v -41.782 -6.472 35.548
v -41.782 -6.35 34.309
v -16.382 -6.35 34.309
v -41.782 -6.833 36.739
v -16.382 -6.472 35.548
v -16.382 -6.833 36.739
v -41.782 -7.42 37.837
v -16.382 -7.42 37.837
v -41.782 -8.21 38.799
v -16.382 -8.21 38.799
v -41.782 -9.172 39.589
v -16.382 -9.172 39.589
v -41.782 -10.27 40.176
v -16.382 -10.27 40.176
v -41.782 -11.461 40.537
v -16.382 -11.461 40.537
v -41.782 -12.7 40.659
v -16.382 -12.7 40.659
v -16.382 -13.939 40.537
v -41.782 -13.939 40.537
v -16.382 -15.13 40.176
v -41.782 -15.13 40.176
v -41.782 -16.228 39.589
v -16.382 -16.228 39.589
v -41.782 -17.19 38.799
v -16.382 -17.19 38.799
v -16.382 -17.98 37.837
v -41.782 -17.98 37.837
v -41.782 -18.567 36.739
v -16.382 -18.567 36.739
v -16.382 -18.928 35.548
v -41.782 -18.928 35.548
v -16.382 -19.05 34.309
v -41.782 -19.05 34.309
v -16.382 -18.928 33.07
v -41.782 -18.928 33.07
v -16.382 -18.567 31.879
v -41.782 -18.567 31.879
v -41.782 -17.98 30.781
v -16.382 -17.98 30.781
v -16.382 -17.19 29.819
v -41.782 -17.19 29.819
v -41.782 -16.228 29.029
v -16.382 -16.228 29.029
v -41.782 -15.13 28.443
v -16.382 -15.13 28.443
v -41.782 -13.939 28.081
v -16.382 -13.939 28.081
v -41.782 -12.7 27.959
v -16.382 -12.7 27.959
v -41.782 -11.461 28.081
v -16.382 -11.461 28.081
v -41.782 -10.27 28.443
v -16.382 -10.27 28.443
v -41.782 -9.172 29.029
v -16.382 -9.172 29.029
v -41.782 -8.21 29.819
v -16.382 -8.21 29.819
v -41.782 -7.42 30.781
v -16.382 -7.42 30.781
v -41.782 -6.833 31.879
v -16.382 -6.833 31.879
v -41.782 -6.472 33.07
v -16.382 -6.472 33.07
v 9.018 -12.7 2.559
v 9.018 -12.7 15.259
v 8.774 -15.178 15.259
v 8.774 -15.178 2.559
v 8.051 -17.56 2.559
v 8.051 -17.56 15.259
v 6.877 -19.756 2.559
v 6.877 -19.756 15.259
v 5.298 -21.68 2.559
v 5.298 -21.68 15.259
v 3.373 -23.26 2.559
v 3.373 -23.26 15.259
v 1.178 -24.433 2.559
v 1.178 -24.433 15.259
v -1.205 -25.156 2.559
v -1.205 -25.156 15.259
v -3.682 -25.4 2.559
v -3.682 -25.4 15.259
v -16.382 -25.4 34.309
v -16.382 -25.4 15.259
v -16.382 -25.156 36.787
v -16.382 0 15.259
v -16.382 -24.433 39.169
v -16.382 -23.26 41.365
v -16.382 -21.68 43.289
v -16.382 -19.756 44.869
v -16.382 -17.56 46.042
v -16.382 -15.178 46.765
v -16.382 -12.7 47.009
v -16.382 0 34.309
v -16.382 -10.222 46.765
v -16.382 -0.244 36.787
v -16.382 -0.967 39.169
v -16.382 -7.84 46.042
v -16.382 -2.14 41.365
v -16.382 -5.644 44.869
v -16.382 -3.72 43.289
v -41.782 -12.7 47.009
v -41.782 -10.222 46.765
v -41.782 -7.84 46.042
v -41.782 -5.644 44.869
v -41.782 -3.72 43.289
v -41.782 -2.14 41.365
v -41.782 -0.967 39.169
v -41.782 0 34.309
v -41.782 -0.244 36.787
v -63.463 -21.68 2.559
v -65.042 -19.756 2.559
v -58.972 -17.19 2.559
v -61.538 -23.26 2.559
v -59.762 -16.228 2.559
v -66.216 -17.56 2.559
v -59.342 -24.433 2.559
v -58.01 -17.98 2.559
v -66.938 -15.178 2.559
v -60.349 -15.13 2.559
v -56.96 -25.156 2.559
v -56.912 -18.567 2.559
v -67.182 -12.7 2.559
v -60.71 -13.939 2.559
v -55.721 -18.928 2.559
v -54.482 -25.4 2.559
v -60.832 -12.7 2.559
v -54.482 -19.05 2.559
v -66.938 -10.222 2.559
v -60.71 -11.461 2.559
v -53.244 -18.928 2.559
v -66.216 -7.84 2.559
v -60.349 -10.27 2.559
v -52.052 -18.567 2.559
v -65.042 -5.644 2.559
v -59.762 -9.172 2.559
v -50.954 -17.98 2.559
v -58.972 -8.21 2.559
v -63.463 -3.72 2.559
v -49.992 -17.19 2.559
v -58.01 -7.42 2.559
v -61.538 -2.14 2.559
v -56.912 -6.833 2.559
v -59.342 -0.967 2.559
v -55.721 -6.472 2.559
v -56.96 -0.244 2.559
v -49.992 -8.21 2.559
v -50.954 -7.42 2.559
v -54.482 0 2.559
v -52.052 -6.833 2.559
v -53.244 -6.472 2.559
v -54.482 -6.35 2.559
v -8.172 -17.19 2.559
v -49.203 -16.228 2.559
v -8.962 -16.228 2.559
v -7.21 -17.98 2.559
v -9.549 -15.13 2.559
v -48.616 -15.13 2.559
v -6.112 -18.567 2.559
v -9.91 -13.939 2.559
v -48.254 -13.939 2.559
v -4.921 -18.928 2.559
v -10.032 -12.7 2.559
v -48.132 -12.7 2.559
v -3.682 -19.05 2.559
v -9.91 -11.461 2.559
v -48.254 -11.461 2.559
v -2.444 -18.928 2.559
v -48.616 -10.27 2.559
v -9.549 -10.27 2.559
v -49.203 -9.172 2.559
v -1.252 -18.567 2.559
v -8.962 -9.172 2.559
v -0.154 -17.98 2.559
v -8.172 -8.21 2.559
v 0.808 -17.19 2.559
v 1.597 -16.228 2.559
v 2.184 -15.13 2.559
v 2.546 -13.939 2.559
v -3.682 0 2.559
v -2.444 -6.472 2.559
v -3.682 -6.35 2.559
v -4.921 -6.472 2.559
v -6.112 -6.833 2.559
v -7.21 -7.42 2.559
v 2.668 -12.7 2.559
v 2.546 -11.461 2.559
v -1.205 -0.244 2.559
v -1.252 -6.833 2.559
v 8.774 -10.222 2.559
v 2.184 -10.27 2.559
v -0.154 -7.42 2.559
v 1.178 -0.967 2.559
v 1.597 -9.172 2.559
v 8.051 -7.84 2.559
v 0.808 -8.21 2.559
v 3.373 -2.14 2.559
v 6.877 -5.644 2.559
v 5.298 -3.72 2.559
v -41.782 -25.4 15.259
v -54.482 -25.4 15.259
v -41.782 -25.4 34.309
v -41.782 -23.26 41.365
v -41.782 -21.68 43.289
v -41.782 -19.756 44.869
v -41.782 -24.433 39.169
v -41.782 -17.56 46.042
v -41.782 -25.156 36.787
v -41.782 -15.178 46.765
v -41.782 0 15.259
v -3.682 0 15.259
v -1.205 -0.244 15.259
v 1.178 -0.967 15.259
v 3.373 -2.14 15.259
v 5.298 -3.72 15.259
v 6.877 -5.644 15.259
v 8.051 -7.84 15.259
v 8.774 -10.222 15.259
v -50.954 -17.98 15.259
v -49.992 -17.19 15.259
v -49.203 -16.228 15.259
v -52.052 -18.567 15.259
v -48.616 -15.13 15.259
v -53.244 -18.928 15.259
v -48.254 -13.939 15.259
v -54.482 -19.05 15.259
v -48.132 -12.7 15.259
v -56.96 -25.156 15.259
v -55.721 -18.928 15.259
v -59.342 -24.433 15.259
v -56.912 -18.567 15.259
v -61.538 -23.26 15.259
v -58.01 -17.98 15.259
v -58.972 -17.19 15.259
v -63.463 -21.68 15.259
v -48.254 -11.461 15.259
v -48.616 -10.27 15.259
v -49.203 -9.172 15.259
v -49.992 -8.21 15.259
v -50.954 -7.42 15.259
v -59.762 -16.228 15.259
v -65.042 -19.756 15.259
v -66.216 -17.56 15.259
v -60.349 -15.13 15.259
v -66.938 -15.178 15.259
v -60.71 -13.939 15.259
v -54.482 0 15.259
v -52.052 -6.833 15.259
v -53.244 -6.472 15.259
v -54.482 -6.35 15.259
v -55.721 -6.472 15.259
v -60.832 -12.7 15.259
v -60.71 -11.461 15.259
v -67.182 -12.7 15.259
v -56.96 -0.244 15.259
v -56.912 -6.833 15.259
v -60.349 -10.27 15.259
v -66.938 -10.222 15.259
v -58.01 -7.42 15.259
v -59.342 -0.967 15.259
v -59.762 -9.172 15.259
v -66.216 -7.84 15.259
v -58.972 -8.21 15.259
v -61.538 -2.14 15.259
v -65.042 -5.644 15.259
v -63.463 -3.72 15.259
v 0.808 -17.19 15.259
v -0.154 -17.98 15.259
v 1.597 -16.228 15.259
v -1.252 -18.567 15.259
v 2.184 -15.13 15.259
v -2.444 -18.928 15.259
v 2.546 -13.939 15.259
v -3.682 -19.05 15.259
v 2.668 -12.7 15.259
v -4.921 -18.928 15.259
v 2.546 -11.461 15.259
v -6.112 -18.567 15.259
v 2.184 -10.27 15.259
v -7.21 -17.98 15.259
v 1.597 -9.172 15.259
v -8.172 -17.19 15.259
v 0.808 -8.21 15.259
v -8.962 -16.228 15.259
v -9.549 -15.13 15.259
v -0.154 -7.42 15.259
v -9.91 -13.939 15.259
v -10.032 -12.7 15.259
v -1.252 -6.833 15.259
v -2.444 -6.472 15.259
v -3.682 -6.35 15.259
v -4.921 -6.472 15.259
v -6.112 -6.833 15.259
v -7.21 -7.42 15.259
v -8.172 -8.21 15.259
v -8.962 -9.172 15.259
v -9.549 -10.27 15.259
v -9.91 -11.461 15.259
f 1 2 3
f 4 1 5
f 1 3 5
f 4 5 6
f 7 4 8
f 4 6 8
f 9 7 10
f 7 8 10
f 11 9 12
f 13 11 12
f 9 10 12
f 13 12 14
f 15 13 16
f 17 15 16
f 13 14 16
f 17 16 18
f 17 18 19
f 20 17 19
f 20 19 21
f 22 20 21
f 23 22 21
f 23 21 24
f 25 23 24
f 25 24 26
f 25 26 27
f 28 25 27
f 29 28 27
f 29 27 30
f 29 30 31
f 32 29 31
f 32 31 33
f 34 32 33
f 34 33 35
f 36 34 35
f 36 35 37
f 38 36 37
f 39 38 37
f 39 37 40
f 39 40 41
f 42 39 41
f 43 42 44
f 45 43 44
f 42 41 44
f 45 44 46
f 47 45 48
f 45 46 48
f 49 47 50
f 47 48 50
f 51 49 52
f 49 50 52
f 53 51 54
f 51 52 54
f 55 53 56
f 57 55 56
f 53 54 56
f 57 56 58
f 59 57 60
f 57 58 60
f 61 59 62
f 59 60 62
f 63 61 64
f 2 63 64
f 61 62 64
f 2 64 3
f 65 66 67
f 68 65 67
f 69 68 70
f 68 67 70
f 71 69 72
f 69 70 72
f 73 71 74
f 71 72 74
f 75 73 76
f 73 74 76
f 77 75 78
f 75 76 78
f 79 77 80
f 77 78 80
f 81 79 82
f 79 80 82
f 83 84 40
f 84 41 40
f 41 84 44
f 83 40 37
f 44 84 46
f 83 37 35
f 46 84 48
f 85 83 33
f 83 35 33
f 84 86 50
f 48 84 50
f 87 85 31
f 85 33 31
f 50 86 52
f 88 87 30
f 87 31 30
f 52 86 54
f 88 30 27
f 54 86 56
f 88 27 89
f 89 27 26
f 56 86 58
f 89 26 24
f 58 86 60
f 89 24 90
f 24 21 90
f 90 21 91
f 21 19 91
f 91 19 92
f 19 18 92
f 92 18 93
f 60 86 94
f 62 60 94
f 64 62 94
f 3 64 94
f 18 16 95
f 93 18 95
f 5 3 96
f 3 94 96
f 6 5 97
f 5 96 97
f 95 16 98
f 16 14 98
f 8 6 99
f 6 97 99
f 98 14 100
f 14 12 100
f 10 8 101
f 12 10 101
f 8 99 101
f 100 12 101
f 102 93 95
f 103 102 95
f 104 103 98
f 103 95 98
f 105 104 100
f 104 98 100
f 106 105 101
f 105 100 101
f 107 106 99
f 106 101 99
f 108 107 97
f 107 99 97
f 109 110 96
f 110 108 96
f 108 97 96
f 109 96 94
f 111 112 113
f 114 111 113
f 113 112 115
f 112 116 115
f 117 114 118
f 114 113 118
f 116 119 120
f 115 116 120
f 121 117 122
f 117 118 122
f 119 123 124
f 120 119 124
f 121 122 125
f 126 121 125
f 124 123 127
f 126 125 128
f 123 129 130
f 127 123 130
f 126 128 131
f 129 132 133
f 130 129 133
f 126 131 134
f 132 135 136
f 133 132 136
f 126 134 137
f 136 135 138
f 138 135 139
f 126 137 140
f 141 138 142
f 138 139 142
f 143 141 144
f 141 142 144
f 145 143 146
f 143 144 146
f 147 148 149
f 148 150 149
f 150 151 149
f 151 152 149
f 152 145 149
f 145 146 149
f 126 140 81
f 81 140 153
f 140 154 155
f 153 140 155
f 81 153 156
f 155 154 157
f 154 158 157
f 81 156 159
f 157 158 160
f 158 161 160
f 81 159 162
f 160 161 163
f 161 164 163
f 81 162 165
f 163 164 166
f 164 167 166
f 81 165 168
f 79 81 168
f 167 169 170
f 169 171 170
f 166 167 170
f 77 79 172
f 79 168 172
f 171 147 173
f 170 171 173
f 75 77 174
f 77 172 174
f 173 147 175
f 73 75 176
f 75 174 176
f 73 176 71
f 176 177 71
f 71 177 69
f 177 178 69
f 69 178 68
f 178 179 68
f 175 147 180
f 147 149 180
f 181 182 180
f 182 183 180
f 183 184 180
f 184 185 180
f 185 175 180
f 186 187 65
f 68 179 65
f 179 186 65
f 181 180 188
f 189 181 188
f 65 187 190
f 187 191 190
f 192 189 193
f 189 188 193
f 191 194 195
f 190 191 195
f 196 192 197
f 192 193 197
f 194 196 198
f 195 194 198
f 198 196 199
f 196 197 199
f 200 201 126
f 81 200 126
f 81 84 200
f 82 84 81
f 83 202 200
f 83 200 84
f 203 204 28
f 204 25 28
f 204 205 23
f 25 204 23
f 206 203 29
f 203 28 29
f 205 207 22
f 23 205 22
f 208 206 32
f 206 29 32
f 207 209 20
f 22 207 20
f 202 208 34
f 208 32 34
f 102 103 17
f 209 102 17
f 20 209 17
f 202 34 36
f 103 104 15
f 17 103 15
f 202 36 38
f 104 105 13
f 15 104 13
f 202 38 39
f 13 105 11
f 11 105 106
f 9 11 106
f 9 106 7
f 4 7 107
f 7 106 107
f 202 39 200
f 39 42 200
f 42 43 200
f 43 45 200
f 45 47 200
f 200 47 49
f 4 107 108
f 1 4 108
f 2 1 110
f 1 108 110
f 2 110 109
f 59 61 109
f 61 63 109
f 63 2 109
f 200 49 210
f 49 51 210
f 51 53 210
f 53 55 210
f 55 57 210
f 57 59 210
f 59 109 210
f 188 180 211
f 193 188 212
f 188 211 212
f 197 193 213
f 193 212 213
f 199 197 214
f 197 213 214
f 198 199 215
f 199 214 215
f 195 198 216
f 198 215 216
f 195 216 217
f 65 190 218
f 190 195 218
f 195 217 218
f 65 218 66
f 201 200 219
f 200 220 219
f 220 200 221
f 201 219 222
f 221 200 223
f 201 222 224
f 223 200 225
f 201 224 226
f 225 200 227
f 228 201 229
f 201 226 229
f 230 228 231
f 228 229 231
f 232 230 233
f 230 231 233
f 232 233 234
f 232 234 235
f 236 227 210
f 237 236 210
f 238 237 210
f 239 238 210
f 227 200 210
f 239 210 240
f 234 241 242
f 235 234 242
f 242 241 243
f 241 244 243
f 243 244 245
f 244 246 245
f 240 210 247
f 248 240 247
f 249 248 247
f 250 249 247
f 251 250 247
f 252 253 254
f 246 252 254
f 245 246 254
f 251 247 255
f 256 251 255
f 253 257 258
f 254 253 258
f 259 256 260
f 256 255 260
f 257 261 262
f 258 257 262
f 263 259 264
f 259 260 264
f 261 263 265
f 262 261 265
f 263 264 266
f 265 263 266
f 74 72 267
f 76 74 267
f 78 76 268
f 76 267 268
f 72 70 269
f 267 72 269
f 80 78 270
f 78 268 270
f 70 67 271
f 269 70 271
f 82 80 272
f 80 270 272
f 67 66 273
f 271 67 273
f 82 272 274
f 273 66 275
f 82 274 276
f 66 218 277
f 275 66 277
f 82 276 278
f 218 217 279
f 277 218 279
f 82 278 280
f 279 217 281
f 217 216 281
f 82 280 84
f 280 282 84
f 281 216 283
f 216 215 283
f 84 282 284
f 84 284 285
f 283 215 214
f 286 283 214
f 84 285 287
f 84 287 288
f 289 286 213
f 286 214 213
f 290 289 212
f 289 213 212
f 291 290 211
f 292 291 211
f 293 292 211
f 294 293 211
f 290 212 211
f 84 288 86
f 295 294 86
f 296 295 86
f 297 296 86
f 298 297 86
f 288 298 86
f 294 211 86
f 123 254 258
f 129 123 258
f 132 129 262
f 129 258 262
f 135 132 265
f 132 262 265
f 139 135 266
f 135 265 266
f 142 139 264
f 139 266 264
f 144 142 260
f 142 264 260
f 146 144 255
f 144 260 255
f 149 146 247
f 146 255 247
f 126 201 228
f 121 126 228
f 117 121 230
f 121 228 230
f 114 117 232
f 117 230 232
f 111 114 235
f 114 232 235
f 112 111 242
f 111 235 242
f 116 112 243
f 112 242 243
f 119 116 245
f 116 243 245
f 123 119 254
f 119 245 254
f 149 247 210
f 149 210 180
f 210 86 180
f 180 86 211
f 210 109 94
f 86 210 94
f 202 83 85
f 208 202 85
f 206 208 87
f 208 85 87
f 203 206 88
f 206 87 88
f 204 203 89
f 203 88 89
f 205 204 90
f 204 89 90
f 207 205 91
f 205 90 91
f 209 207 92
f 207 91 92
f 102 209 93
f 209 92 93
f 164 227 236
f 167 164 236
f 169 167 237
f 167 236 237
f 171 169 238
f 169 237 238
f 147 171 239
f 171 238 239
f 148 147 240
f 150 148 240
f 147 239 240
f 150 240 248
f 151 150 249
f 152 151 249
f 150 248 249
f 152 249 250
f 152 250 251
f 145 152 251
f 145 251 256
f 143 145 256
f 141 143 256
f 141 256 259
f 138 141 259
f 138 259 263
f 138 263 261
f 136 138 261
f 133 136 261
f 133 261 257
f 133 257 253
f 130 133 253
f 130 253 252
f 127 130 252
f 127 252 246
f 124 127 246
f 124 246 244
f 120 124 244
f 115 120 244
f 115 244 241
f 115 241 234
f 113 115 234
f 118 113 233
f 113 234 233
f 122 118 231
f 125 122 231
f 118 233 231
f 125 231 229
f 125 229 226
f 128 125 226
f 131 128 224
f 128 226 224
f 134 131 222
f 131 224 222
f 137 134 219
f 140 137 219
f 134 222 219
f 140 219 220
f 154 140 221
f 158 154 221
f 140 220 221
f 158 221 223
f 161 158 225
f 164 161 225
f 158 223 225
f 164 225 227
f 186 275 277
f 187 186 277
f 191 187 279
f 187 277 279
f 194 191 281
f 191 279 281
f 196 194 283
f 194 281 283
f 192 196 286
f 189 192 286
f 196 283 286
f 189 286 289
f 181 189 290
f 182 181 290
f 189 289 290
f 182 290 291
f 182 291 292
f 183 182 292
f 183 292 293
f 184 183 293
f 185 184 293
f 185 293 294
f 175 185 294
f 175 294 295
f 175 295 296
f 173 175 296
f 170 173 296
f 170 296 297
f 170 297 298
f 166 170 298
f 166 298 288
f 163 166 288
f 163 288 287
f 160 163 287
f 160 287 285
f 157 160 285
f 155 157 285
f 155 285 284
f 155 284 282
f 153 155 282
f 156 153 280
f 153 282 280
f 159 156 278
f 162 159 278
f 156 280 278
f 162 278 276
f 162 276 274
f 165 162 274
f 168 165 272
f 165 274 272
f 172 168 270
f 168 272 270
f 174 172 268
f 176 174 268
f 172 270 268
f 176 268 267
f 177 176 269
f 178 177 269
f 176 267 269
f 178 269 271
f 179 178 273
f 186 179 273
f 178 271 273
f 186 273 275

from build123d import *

# Parameters (mm, degrees)
F1_DEPTH  = 25.4
F2_R      = 6.35
F3_DEPTH  = 12.701
F5_DEPTH  = 50.801
F6_R      = 6.35
F7_DEPTH  = 50.801
F9_DEPTH  = 12.701
F11_DEPTH = 12.701


with BuildPart() as f1:
    # F0 (on Front) → F1 (new body)
    with BuildSketch(Plane.XZ):
        Polygon((-41.7823548415, 15.2591690152), (-67.1823548415, 15.2591690152), (-67.1823548415, 2.5591690152), (9.0176451585, 2.5591690152), (9.0176451585, 15.2591690152), (-16.3823548415, 15.2591690152), (-16.3823548415, 47.0091690152), (-41.7823548415, 47.0091690152), align=None)
    extrude(amount=F1_DEPTH)

    # F2 (on face) → F3 (cut, through all)
    with BuildSketch(Plane.XY.offset(15.2591690152)):
        with Locations((-54.4823548415, -12.7)):
            Circle(F2_R)
        with Locations((-3.6823548415, -12.7)):
            Circle(F2_R)
    extrude(amount=-F3_DEPTH, mode=Mode.SUBTRACT)

    # F4 (on face) → F5 (cut, through all)
    with BuildSketch(Plane.YZ.offset(-16.3823548415)):
        with BuildLine():
            ThreePointArc((-25.4, 34.3091690152), (-21.6802561211, 43.2894251362), (-12.7, 47.0091690152))
            Line((-12.7, 47.0091690152), (-25.4, 47.0091690152))
            Line((-25.4, 47.0091690152), (-25.4, 34.3091690152))
        make_face()
        with BuildLine():
            ThreePointArc((-12.7, 47.0091690152), (-3.7197438789, 43.2894251362), (0, 34.3091690152))
            Line((0, 34.3091690152), (0, 47.0091690152))
            Line((0, 47.0091690152), (-12.7, 47.0091690152))
        make_face()
    extrude(amount=-F5_DEPTH, mode=Mode.SUBTRACT)

    # F6 (on face) → F7 (cut, through all)
    with BuildSketch(Plane.YZ.offset(-16.3823548415)):
        with Locations((-12.7, 34.3091690152)):
            Circle(F6_R)
    extrude(amount=-F7_DEPTH, mode=Mode.SUBTRACT)

    # F8 (on face) → F9 (cut, through all)
    with BuildSketch(Plane.XY.offset(15.2591690152)):
        with BuildLine():
            ThreePointArc((-3.6823548415, 0), (5.2979012796, -3.7197438789), (9.0176451585, -12.7))
            Line((9.0176451585, -12.7), (9.0176451585, 0))
            Line((9.0176451585, 0), (-3.6823548415, 0))
        make_face()
        with BuildLine():
            Line((9.0176451585, -25.4), (9.0176451585, -12.7))
            ThreePointArc((9.0176451585, -12.7), (5.2979012796, -21.6802561211), (-3.6823548415, -25.4))
            Line((-3.6823548415, -25.4), (9.0176451585, -25.4))
        make_face()
    extrude(amount=-F9_DEPTH, mode=Mode.SUBTRACT)

    # F10 (on face) → F11 (cut, through all)
    with BuildSketch(Plane.XY.offset(15.2591690152)):
        with BuildLine():
            ThreePointArc((-67.1823548415, -12.7), (-63.4626109626, -3.7197438789), (-54.4823548415, 0))
            Line((-54.4823548415, 0), (-67.1823548415, 0))
            Line((-67.1823548415, 0), (-67.1823548415, -12.7))
        make_face()
        with BuildLine():
            Line((-67.1823548415, -25.4), (-54.4823548415, -25.4))
            ThreePointArc((-54.4823548415, -25.4), (-63.4626109626, -21.6802561211), (-67.1823548415, -12.7))
            Line((-67.1823548415, -12.7), (-67.1823548415, -25.4))
        make_face()
    extrude(amount=-F11_DEPTH, mode=Mode.SUBTRACT)


solid = f1.part
